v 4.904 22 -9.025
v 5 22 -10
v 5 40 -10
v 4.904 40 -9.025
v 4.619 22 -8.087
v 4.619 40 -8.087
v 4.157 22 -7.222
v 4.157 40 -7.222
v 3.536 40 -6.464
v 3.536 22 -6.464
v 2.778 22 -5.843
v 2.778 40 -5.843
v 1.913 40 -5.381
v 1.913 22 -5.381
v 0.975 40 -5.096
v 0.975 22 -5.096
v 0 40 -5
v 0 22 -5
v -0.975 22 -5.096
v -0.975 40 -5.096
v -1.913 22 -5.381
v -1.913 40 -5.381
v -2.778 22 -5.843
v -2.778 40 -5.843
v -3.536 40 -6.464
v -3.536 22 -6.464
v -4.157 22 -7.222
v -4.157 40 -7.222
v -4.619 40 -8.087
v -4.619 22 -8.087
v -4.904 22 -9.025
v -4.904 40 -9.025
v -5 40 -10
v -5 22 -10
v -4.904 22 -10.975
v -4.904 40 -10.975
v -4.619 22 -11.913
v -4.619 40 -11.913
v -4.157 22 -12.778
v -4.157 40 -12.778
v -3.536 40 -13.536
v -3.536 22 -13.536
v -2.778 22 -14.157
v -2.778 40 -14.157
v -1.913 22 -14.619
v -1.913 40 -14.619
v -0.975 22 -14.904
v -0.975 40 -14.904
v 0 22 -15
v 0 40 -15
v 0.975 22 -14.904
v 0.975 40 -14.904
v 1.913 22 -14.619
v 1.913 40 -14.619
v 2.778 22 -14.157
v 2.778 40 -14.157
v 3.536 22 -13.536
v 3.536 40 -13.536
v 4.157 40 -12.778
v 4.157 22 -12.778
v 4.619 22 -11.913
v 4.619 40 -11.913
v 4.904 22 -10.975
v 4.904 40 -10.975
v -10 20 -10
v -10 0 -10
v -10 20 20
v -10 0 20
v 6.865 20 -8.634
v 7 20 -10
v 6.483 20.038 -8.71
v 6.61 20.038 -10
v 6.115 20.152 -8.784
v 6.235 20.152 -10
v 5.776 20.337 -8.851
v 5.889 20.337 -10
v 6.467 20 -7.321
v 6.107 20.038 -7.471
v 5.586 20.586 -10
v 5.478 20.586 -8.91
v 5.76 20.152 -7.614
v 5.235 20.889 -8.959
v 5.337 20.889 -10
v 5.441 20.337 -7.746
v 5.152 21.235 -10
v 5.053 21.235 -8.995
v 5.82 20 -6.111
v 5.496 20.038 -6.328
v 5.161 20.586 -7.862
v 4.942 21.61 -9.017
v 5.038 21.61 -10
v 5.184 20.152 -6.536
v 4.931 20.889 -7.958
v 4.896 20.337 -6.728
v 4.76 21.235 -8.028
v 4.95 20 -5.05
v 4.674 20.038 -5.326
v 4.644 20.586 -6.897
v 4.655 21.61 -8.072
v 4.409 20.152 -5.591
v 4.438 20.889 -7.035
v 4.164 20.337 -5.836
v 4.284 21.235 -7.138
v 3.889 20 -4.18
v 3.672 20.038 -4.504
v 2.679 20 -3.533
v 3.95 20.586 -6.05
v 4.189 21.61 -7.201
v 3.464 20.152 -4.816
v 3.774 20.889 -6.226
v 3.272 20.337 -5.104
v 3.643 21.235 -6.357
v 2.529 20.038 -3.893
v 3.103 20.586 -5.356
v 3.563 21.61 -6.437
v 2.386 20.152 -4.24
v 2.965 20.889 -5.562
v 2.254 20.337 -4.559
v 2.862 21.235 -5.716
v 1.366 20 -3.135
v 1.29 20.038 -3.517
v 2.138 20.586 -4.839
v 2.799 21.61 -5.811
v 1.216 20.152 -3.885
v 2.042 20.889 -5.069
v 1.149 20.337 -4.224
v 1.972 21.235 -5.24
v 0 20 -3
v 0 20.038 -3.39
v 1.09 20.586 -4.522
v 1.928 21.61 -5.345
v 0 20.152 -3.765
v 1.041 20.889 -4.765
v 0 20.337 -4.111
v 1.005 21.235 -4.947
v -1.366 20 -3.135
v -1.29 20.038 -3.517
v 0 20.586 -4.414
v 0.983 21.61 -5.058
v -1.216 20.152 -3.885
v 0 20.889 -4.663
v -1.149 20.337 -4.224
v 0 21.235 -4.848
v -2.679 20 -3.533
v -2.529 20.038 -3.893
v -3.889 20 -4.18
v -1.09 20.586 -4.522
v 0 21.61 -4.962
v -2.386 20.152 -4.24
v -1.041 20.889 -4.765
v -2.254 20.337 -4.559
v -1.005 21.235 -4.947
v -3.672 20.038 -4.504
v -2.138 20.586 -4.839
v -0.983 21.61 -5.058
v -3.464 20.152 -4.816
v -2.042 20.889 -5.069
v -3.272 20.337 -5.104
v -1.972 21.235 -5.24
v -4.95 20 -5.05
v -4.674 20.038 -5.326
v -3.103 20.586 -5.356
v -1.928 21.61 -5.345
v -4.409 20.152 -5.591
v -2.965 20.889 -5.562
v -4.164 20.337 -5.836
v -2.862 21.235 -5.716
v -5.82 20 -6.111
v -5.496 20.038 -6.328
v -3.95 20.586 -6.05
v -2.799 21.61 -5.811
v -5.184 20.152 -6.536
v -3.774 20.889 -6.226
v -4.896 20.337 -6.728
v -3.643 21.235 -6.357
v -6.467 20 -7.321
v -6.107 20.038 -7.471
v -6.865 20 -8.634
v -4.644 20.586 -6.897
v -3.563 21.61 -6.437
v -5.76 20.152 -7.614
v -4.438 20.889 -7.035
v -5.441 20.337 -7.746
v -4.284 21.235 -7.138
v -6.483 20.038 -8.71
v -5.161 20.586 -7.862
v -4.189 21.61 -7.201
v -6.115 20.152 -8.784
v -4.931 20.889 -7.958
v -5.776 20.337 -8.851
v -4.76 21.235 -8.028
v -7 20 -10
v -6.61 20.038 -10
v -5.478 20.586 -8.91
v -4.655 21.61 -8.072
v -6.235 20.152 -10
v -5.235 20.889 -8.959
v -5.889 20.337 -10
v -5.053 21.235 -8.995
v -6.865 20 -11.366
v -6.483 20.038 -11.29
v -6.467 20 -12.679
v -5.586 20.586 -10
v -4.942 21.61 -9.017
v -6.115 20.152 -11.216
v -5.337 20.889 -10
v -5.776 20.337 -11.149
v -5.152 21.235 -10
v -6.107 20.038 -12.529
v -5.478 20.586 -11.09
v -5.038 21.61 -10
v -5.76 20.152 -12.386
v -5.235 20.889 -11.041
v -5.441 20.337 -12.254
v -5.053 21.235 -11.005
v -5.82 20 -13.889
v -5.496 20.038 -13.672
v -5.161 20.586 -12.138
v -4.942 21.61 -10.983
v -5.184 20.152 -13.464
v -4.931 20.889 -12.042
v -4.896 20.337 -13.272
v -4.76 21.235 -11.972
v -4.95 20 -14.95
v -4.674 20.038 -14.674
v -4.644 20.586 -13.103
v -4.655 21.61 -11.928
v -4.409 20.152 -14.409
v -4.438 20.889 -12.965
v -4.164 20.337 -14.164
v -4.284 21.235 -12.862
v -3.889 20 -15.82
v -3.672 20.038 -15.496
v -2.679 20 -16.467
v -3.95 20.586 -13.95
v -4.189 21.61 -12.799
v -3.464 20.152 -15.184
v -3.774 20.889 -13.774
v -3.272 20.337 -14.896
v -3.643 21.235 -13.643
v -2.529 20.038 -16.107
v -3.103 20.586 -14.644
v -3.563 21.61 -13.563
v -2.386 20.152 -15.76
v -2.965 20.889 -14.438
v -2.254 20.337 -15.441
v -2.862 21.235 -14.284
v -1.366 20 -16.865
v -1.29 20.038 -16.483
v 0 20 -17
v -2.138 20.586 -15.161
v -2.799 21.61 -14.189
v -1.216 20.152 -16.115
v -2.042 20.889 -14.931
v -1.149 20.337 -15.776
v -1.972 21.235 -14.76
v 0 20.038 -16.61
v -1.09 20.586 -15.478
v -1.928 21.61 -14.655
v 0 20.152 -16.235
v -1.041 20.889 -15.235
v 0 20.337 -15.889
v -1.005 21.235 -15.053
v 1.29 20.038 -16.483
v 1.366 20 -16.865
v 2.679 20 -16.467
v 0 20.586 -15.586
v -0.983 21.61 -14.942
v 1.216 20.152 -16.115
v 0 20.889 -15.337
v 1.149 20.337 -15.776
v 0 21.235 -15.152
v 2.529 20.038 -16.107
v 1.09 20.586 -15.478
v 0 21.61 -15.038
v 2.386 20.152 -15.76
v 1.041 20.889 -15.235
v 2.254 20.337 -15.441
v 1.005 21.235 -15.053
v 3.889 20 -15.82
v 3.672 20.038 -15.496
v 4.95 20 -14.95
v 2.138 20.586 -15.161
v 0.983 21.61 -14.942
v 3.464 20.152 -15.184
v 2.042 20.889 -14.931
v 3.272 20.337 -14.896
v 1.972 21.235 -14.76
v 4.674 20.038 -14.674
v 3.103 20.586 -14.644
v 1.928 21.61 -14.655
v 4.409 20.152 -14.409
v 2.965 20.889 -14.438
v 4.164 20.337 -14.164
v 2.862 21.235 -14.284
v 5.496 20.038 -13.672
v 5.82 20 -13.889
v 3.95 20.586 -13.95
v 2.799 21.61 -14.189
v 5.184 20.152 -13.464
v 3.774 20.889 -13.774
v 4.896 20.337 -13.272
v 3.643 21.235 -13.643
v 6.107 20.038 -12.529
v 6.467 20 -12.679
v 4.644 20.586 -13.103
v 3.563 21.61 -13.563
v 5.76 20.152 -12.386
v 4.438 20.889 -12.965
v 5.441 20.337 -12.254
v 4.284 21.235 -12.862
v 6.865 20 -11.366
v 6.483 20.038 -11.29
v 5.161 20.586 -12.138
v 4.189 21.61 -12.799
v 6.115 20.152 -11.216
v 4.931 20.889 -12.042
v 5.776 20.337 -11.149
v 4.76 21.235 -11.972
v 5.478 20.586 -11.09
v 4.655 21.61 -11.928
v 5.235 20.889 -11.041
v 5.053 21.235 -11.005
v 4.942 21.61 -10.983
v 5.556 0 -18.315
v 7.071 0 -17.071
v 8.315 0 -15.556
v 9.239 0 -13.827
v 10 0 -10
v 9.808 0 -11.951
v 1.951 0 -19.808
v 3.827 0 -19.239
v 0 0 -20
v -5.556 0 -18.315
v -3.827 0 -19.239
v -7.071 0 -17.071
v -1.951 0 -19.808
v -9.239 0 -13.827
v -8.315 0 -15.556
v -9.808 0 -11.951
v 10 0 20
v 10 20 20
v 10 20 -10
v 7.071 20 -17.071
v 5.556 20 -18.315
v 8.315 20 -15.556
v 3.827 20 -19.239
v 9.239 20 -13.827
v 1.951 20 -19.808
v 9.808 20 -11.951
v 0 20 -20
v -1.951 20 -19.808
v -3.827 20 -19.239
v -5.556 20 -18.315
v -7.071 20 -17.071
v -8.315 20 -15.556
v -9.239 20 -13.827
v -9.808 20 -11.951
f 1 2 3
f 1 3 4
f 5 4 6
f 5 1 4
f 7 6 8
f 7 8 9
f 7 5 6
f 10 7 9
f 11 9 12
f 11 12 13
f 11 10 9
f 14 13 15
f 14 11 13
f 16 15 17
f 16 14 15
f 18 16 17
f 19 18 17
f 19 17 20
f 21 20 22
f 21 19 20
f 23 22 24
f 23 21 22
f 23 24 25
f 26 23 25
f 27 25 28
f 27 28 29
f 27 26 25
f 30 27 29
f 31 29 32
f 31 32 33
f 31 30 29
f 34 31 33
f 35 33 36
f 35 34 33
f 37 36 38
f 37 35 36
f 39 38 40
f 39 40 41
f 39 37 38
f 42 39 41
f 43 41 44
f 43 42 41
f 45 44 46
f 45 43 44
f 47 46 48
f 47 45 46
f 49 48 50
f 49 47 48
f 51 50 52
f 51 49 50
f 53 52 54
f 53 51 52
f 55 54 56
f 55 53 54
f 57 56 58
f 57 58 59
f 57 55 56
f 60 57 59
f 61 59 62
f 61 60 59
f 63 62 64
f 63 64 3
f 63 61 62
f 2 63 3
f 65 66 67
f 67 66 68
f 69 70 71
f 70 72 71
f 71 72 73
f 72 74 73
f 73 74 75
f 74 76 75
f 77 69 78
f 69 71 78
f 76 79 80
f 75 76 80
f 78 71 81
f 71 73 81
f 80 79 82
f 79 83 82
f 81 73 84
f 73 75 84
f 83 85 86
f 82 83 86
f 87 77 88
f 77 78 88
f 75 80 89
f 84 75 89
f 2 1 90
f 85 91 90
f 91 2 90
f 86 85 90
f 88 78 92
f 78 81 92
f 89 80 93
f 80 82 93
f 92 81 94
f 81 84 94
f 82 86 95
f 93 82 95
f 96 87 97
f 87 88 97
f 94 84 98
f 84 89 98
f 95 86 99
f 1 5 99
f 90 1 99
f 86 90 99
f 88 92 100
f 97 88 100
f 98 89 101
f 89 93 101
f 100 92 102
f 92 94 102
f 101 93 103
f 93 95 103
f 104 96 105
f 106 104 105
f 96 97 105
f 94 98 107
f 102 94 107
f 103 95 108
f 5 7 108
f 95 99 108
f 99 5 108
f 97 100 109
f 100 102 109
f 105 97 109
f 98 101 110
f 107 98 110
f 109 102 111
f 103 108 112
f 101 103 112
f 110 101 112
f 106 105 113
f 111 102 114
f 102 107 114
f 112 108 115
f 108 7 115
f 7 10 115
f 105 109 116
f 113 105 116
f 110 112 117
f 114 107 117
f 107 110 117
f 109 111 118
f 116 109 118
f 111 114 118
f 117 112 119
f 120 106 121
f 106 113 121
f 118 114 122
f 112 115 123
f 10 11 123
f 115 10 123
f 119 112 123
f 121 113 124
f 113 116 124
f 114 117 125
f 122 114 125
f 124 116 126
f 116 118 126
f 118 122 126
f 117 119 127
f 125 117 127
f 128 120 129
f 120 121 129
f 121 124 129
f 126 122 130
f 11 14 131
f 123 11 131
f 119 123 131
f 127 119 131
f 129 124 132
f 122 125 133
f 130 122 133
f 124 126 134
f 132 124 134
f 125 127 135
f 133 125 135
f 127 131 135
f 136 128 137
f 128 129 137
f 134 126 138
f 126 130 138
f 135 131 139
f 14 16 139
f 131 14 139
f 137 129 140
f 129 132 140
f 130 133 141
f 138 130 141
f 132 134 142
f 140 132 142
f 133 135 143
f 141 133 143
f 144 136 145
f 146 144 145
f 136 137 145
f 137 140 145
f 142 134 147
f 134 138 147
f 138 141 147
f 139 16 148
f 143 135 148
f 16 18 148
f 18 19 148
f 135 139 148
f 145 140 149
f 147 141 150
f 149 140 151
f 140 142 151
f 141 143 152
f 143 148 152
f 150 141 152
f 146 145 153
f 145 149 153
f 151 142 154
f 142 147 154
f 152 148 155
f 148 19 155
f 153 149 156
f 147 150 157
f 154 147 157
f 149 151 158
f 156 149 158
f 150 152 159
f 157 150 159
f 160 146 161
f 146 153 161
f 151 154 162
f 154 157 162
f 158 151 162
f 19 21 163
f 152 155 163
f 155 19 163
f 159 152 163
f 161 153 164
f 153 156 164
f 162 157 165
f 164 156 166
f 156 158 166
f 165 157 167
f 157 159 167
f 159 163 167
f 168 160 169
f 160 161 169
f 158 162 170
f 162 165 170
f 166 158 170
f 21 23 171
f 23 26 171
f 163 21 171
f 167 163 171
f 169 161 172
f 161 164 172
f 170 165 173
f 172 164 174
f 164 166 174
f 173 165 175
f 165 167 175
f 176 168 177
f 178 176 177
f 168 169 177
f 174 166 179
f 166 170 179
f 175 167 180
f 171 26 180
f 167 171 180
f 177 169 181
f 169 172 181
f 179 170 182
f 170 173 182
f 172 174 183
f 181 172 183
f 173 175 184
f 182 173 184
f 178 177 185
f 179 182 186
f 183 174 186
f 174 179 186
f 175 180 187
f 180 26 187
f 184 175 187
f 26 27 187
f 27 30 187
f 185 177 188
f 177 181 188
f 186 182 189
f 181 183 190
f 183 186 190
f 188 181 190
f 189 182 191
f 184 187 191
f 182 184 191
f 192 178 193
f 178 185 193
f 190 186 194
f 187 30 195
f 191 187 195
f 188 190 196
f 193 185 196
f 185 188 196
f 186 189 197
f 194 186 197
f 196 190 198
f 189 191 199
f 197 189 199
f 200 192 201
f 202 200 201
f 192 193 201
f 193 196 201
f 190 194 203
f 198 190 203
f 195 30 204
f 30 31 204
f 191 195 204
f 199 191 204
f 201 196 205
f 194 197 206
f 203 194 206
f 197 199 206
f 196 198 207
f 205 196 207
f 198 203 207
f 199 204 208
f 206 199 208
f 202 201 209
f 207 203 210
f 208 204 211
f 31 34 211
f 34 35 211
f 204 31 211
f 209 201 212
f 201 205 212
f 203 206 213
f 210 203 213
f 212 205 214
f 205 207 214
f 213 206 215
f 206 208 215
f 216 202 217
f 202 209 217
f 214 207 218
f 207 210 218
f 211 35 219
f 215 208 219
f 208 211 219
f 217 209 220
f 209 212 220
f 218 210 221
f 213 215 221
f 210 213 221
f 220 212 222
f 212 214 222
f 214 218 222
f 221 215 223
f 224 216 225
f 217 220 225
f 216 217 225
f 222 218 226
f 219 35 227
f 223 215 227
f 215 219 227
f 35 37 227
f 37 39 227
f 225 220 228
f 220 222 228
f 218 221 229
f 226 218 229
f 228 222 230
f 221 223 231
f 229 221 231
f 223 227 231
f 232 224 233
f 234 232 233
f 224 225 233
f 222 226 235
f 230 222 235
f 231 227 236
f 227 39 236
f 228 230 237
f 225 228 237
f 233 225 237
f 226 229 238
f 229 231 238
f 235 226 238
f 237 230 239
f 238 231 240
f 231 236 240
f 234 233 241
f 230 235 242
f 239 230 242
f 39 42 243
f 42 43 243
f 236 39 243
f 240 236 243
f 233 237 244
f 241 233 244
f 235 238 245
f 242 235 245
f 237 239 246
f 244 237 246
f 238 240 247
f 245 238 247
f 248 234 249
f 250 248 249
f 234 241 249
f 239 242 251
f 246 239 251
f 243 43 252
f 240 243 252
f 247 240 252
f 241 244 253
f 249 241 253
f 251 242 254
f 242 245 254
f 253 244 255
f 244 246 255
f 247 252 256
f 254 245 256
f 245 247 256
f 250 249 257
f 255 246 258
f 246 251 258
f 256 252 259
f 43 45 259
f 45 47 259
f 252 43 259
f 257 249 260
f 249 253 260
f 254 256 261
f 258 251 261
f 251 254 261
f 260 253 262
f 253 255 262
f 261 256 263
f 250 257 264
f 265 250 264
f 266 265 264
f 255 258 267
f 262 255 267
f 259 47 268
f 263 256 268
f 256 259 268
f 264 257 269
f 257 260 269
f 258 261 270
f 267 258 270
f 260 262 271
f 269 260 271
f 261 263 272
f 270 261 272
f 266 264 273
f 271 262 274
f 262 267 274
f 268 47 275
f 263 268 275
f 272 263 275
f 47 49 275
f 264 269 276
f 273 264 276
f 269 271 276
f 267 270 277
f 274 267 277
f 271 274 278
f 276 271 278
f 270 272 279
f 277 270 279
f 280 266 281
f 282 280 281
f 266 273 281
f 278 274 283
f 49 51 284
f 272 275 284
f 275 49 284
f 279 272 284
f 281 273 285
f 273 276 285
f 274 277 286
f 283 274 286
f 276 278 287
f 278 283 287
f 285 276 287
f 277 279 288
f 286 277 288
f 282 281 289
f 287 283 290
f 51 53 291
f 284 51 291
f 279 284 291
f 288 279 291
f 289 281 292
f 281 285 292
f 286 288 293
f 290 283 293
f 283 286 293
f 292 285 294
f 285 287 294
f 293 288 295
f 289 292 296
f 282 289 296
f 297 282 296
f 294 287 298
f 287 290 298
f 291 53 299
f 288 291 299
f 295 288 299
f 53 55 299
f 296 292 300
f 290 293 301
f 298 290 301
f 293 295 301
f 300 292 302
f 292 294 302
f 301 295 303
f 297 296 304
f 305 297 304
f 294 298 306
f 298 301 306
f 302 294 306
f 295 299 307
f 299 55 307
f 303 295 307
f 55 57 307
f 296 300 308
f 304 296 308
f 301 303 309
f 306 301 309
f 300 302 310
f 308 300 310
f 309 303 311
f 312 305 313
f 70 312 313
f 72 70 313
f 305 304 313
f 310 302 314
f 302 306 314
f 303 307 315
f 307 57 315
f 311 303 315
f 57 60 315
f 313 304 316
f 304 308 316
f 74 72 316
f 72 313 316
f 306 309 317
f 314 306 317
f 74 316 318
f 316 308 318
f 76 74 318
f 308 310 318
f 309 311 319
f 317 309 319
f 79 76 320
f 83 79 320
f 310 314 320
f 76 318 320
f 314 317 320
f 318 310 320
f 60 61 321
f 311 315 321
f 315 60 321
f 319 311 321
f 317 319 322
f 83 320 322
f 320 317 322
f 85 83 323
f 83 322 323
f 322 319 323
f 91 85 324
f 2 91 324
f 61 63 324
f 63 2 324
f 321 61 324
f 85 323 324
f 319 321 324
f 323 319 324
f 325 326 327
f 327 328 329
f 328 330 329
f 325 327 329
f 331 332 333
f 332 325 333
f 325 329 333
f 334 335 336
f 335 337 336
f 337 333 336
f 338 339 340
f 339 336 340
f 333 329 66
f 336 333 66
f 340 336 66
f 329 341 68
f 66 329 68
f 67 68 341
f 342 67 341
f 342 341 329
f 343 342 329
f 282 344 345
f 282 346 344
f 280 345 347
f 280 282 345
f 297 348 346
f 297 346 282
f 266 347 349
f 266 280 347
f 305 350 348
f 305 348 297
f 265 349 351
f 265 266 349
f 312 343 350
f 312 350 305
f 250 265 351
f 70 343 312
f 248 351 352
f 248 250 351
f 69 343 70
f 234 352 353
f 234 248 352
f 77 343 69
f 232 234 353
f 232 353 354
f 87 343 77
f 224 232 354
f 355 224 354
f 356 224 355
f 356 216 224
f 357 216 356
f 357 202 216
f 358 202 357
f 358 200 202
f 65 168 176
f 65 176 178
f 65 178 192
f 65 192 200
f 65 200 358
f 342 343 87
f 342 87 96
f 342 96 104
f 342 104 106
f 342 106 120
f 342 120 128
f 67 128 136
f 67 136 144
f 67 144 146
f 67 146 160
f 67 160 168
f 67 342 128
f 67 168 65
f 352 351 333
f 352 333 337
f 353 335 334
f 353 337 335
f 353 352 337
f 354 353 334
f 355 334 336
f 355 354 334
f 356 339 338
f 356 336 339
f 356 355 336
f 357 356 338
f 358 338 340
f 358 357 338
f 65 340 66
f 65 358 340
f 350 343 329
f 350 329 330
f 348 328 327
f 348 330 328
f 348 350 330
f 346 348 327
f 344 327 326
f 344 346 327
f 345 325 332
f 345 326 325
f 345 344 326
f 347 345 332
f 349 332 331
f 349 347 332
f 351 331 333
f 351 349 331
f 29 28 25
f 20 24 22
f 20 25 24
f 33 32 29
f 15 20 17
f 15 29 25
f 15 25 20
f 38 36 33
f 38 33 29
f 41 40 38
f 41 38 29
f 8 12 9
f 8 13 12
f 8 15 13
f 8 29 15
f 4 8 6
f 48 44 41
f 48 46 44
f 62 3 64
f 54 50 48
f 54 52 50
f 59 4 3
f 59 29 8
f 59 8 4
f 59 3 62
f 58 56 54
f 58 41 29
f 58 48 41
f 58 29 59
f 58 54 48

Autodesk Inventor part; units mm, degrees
ref_plane "YZ Plane" through (0, 0, 0) normal (1, 0, 0) x (0, 1, 0)
ref_plane "XZ Plane" through (0, 0, 0) normal (0, 1, 0) x (-1, 0, 0)
ref_plane "XY Plane" through (0, 0, 0) normal (0, 0, 1) x (1, 0, 0)
sketch "Schizzo1" plane through (0, 0, 0) normal (0, 1, 0) x (-1, 0, 0)
  line L0 (10, 20) -> (-10, 20)
  line L1 (-10, 20) -> (-10, -20)
  line L2 (-10, -20) -> (10, -20)
  line L3 (10, -20) -> (10, 20)
  line L4 (10, 20) -> (-10, -20) construction
  line L5 (-10, 20) -> (10, -20) construction
  point P0 (0, 0)
  dimension "d0" = 40
  dimension "d1" = 20
extrude "Estrusione1" add sketch "Schizzo1" along normal blind 20
sketch "Schizzo2" plane through (0, 20, 0) normal (0, 1, 0) x (1, 0, 0)
  line L0 (0, 0) -> (0, 10)
  circle A0 centre (0, 10) radius 5
  dimension "d4" = 10
  dimension "d5" = 10
extrude "Estrusione2" add sketch "Schizzo2" along normal blind 20
fillet "Raccordo1" radius 10 2 edges at (10, 10, -20) (-10, 10, -20)
fillet "Raccordo2" radius 2 1 edges at (-5, 20, -10)
properties part number "05-17-2023 cardine inferiore analisi fem"
